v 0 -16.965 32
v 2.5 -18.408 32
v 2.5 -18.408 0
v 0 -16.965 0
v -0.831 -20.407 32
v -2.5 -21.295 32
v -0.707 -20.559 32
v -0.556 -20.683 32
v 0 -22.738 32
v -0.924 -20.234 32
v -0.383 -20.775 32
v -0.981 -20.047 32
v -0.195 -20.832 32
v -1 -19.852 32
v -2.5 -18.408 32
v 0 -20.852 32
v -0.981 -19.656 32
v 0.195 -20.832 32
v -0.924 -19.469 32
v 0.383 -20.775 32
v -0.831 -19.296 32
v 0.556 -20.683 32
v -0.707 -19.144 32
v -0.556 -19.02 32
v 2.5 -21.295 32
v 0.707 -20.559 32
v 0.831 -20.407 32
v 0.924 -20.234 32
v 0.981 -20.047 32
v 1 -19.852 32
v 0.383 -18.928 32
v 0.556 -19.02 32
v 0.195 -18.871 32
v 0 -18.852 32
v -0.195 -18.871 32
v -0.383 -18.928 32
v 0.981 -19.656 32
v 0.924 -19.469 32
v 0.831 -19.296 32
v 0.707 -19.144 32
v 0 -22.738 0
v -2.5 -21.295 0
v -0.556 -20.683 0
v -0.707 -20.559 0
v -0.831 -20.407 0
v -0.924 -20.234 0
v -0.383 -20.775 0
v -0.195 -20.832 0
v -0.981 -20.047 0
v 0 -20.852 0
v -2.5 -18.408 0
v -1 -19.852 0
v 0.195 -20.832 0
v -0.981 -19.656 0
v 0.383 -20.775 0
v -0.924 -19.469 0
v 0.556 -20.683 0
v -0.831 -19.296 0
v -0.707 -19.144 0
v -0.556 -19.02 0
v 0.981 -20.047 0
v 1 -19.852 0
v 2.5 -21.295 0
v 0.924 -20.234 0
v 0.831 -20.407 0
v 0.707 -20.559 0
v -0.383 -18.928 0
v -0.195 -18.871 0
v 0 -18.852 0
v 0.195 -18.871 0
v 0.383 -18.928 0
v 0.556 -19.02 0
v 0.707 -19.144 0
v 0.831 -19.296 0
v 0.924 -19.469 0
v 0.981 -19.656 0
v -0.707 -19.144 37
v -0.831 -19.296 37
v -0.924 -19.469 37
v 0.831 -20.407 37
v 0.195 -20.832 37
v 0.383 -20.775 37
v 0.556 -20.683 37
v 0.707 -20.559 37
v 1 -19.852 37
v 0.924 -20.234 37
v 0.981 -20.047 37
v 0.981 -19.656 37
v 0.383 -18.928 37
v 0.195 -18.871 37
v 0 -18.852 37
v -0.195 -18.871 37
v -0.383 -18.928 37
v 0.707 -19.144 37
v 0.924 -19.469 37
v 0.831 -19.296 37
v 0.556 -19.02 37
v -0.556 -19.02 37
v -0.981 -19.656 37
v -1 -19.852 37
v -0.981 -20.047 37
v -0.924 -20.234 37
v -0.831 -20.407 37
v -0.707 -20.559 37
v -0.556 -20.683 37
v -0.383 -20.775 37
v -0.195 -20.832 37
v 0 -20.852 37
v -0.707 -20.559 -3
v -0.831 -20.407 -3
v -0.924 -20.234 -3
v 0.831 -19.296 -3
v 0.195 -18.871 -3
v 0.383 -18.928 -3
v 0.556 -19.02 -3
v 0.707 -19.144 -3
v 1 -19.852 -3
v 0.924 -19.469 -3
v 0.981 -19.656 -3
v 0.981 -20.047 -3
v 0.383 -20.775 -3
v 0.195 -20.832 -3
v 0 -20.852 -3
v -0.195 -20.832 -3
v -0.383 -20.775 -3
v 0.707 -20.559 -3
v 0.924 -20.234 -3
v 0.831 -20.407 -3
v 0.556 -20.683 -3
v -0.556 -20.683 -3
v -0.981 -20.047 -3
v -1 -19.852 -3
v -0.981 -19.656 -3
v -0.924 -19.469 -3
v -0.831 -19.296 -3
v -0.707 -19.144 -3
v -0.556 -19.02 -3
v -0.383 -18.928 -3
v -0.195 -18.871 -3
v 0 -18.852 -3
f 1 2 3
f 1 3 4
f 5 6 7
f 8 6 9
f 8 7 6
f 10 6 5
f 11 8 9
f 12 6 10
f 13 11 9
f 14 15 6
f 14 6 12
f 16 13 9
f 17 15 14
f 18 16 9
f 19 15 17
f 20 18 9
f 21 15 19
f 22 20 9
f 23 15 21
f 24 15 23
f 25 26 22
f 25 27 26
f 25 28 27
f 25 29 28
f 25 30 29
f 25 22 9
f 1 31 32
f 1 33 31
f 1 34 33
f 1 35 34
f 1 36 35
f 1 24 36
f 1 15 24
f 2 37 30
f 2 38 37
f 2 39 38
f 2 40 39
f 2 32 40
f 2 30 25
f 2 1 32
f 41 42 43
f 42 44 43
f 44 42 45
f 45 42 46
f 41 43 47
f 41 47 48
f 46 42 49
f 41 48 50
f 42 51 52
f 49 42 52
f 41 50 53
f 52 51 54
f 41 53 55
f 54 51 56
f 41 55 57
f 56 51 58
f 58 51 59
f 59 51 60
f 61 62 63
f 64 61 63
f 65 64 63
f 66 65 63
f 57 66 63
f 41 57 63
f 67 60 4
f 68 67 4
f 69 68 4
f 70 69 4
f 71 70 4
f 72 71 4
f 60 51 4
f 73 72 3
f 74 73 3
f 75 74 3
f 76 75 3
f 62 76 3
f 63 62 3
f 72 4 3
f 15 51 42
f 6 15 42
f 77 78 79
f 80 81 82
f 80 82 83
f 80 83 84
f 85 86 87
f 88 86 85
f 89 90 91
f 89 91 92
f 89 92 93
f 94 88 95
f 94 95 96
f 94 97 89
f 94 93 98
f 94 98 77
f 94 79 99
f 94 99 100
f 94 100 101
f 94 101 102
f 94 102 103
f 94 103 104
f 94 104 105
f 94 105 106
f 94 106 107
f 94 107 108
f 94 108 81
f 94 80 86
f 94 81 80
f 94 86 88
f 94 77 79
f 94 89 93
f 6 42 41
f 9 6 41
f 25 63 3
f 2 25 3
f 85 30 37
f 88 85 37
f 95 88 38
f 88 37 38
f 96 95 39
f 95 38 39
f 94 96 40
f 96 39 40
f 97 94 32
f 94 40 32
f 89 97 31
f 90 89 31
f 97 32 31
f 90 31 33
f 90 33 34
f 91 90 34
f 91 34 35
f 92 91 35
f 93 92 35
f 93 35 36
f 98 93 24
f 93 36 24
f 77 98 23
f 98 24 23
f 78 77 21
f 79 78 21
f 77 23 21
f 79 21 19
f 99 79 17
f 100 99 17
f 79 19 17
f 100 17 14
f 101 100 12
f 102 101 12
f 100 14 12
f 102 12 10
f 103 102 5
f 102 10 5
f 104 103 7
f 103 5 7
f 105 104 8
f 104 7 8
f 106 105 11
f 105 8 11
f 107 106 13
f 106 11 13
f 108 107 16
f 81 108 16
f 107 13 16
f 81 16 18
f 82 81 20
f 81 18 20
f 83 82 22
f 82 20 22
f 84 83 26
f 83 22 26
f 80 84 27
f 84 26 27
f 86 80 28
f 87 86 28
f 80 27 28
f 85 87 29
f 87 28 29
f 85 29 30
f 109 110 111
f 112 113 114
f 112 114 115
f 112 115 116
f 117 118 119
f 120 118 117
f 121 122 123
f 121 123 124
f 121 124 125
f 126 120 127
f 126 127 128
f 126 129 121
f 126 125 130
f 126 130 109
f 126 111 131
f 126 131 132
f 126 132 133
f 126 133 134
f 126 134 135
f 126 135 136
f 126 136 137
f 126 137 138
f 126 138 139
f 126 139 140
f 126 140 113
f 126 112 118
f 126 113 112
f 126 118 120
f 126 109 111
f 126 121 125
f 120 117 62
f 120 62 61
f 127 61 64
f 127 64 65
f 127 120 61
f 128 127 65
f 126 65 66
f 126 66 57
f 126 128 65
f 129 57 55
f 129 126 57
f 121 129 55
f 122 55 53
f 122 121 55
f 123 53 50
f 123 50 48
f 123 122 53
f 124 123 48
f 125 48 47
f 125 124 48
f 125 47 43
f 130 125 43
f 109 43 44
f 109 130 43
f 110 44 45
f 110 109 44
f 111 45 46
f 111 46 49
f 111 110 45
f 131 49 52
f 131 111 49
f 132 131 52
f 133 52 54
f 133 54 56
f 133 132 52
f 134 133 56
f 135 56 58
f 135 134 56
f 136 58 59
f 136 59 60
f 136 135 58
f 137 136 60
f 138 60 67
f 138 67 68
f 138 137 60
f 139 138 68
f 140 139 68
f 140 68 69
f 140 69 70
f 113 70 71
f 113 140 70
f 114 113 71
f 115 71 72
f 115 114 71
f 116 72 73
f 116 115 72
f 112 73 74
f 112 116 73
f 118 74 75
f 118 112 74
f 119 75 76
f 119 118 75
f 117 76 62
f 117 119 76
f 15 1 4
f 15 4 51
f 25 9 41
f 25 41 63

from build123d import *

# Parameters (mm, degrees)
ESTRUSIONE_ESTRUSIONE1_DEPTH = 32
SCHIZZO2_R                   = 1
ESTRUSIONE_ESTRUSIONE2_DEPTH = 5
ESTRUSIONE_ESTRUSIONE3_START = 3
SCHIZZO4_R                   = 1
ESTRUSIONE_ESTRUSIONE3_DEPTH = 3


with BuildPart() as part:
    # Schizzo1 → Estrusione-Estrusione1 (new body)
    with BuildSketch(Plane.XY):
        Polygon((0, -16.964772049), (-2.5, -18.408147722), (-2.5, -21.294899068), (0, -22.738274741), (2.5, -21.294899068), (2.5, -18.408147722), align=None)
    extrude(amount=ESTRUSIONE_ESTRUSIONE1_DEPTH)

    # Schizzo2 → Estrusione-Estrusione2 (add)
    with BuildSketch(Plane.XY.offset(32)):
        with Locations((0, -19.851523395)):
            Circle(SCHIZZO2_R)
    extrude(amount=ESTRUSIONE_ESTRUSIONE2_DEPTH)

    # Schizzo4 → Estrusione-Estrusione3 (add)
    with BuildSketch(Plane(origin=(0, 0, 0), x_dir=(-1, 0, 0), z_dir=(0, 0, -1)).offset(ESTRUSIONE_ESTRUSIONE3_START)):
        with Locations(Location((0, -19.851523395, 0), (0, 0, 180))):
            Circle(SCHIZZO4_R)
    extrude(amount=-ESTRUSIONE_ESTRUSIONE3_DEPTH)


solid = part.part
